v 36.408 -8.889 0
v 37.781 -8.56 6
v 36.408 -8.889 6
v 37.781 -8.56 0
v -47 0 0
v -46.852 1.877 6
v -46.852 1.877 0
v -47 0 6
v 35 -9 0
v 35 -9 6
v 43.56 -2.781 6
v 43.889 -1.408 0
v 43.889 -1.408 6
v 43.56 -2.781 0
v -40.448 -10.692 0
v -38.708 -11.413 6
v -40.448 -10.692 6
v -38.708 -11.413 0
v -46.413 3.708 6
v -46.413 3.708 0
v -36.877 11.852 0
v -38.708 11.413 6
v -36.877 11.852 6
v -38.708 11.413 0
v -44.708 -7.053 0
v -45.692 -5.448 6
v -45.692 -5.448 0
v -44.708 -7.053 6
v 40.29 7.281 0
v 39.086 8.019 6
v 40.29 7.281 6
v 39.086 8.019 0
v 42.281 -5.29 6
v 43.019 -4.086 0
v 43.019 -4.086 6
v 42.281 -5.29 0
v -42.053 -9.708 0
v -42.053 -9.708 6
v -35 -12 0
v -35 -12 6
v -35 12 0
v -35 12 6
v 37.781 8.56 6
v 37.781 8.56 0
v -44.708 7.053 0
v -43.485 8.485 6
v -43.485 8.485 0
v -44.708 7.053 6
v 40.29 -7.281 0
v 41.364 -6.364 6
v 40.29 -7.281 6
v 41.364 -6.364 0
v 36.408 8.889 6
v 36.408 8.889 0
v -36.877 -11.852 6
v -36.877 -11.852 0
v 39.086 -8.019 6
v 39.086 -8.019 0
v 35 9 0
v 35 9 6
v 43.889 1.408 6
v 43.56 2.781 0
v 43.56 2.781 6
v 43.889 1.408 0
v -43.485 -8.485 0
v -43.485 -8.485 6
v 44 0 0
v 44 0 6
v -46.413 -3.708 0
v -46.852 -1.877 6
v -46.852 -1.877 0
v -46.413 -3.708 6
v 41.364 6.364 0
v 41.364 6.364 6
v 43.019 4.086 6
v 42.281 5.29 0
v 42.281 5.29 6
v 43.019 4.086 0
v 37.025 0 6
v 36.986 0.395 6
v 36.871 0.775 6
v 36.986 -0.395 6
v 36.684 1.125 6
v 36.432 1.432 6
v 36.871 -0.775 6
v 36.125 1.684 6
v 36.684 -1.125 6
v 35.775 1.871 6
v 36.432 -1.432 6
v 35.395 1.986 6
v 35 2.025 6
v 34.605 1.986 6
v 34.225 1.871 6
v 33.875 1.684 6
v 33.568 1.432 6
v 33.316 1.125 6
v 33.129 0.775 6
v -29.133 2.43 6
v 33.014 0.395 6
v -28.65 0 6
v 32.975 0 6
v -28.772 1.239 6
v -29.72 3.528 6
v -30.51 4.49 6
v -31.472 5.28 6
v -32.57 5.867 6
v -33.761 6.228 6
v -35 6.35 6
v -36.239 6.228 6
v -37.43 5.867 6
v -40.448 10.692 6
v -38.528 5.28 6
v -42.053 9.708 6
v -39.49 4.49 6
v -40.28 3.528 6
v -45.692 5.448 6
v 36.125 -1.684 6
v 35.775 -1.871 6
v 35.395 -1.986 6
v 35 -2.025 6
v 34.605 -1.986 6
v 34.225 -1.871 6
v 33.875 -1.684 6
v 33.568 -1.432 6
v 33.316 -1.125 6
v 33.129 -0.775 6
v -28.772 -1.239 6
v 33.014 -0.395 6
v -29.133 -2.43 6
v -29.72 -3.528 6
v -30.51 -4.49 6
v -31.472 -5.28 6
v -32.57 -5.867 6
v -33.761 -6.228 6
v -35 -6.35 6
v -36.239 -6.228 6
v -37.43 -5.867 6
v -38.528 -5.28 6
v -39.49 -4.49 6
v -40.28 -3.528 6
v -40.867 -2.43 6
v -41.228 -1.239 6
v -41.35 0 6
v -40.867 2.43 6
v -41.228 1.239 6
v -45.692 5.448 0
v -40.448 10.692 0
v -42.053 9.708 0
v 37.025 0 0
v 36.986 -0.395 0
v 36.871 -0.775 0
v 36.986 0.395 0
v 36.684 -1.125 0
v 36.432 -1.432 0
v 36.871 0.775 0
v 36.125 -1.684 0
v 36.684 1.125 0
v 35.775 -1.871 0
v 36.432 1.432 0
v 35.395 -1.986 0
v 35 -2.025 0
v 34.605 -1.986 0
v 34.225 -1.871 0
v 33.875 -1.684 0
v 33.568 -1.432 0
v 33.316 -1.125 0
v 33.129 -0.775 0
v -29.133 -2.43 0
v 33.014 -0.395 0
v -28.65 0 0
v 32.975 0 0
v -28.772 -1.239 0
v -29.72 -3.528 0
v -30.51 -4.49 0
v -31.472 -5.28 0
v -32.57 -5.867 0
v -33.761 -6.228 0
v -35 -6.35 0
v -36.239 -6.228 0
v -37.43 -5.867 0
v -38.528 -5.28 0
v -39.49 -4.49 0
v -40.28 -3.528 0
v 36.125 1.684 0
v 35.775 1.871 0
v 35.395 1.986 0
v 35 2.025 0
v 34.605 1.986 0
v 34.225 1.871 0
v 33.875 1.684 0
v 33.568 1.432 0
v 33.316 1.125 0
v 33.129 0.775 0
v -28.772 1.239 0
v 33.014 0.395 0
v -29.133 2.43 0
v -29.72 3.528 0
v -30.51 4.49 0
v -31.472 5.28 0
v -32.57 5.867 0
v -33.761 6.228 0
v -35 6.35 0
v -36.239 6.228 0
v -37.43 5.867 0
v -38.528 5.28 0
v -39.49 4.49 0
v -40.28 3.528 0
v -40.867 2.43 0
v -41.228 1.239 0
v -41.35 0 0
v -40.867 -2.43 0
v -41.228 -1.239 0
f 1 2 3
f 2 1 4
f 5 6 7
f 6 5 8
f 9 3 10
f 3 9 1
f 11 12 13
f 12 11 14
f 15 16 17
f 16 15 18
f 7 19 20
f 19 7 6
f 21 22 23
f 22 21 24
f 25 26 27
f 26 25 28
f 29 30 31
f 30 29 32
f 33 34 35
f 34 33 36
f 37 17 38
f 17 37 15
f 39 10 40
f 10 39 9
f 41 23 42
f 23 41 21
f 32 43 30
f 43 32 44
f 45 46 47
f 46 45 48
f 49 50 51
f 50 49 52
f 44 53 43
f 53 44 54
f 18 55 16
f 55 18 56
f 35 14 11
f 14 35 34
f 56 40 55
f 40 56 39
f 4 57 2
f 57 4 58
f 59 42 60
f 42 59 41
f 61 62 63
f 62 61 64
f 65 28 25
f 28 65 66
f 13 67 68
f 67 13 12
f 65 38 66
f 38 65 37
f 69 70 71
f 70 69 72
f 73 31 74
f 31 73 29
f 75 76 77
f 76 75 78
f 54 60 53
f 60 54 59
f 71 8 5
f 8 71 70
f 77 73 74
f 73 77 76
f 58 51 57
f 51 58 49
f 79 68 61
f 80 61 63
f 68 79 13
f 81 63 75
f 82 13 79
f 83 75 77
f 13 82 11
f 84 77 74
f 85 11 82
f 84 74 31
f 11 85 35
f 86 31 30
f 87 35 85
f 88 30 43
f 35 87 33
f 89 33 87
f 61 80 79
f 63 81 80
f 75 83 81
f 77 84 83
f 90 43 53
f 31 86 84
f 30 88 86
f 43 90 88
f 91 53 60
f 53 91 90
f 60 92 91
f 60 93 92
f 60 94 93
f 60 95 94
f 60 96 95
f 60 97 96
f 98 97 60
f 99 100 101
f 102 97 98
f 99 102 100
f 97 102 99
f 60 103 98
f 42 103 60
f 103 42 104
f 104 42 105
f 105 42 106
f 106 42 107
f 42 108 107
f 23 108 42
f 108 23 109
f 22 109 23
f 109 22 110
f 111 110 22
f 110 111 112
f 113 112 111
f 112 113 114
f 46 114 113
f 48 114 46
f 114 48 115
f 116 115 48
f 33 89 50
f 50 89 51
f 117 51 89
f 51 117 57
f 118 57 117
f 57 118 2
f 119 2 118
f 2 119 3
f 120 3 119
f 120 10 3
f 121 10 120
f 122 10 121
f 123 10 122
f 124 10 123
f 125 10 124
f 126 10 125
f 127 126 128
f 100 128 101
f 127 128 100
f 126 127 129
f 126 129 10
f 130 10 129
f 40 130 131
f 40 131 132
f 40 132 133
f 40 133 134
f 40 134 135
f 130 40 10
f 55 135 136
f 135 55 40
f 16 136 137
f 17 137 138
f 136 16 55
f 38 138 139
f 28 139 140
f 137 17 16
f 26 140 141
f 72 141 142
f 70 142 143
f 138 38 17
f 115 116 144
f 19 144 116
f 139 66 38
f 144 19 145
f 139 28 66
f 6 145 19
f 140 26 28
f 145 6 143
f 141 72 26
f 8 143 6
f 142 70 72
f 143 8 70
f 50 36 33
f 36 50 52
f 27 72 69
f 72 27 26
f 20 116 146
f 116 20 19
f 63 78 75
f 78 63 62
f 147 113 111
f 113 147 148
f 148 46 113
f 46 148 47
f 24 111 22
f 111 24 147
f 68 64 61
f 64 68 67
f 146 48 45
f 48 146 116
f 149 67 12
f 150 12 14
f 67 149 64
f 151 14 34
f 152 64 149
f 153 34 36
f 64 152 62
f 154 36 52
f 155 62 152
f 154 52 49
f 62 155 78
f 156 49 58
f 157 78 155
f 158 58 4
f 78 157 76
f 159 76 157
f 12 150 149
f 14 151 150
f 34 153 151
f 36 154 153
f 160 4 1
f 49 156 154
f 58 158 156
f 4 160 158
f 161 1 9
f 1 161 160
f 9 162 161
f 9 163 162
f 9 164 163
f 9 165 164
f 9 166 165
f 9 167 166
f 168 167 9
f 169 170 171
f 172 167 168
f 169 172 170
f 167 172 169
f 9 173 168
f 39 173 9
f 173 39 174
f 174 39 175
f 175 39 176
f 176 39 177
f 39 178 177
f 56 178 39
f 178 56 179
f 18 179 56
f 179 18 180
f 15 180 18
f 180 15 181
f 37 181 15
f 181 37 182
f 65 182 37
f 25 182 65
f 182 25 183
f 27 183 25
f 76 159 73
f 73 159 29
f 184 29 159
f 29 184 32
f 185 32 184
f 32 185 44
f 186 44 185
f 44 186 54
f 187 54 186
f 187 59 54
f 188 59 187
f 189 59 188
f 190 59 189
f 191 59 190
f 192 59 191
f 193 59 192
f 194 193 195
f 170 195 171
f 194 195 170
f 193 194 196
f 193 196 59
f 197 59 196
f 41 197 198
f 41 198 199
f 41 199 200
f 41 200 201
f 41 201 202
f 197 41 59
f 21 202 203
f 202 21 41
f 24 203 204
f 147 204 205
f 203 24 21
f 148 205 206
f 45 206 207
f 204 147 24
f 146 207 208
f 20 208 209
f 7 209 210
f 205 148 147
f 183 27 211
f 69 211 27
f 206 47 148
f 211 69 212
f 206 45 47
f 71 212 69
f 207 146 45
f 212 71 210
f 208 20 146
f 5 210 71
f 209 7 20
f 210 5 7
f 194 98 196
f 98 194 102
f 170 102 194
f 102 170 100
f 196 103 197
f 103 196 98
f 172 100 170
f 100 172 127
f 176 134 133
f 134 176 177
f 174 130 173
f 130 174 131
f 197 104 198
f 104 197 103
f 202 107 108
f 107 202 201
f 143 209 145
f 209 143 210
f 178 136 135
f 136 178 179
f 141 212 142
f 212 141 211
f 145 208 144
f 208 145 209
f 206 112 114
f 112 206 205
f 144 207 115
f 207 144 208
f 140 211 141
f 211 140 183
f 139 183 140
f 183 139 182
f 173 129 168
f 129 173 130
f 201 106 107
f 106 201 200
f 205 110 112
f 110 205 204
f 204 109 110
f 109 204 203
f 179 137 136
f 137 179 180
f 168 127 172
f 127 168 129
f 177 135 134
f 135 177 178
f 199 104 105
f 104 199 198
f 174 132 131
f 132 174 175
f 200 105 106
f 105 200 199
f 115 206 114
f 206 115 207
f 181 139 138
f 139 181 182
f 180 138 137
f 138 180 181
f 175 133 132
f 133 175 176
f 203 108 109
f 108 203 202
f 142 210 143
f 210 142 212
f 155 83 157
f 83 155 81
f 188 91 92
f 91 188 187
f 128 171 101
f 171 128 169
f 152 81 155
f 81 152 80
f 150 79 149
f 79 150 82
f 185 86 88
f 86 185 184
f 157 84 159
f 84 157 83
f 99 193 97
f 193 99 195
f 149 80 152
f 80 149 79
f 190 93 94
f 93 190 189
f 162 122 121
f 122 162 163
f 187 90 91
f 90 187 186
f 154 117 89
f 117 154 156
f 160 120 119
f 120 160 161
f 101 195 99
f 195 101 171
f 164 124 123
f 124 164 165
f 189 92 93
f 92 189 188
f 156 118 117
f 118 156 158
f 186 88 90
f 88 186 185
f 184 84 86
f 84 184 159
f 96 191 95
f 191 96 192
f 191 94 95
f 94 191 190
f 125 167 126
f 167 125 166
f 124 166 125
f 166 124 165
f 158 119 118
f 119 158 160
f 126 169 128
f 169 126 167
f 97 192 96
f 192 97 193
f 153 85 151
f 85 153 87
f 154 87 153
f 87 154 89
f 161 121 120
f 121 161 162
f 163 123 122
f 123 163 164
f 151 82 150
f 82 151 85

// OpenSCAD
$fn = 32;

// ----------------------------------------------------------------------
// Lever: 70 mm between the bosses, 6 mm thick, smooth outline
// ----------------------------------------------------------------------

// --- parameters (mm) ---
lever_l = 70;             // distance between the boss centres
boss_a = 24;              // first boss diameter
boss_b = 18;              // second boss diameter
bore_a = 12.7;            // first bore
bore_b = 4.05;            // second bore
lever_t = 6;              // lever thickness

lever_profile = [[-47, 0], [-46.852, -1.877], [-46.413, -3.708], [-45.692, -5.448], [-44.708, -7.053], [-43.485, -8.485], [-42.053, -9.708], [-40.448, -10.692], [-38.708, -11.413], [-36.877, -11.852], [-35, -12], [35, -9], [36.408, -8.889], [37.781, -8.56], [39.086, -8.019], [40.29, -7.281], [41.364, -6.364], [42.281, -5.29], [43.019, -4.086], [43.56, -2.781], [43.889, -1.408], [44, 0], [43.889, 1.408], [43.56, 2.781], [43.019, 4.086], [42.281, 5.29], [41.364, 6.364], [40.29, 7.281], [39.086, 8.019], [37.781, 8.56], [36.408, 8.889], [35, 9], [-35, 12], [-36.877, 11.852], [-38.708, 11.413], [-40.448, 10.692], [-42.053, 9.708], [-43.485, 8.485], [-44.708, 7.053], [-45.692, 5.448], [-46.413, 3.708], [-46.852, 1.877]];

difference() {
  linear_extrude(height = lever_t) polygon(lever_profile);
  translate([-35, 0, -2.5]) cylinder(h = lever_t + 5, d = bore_a);
  translate([35, 0, -2.5]) cylinder(h = lever_t + 5, d = bore_b);
}
